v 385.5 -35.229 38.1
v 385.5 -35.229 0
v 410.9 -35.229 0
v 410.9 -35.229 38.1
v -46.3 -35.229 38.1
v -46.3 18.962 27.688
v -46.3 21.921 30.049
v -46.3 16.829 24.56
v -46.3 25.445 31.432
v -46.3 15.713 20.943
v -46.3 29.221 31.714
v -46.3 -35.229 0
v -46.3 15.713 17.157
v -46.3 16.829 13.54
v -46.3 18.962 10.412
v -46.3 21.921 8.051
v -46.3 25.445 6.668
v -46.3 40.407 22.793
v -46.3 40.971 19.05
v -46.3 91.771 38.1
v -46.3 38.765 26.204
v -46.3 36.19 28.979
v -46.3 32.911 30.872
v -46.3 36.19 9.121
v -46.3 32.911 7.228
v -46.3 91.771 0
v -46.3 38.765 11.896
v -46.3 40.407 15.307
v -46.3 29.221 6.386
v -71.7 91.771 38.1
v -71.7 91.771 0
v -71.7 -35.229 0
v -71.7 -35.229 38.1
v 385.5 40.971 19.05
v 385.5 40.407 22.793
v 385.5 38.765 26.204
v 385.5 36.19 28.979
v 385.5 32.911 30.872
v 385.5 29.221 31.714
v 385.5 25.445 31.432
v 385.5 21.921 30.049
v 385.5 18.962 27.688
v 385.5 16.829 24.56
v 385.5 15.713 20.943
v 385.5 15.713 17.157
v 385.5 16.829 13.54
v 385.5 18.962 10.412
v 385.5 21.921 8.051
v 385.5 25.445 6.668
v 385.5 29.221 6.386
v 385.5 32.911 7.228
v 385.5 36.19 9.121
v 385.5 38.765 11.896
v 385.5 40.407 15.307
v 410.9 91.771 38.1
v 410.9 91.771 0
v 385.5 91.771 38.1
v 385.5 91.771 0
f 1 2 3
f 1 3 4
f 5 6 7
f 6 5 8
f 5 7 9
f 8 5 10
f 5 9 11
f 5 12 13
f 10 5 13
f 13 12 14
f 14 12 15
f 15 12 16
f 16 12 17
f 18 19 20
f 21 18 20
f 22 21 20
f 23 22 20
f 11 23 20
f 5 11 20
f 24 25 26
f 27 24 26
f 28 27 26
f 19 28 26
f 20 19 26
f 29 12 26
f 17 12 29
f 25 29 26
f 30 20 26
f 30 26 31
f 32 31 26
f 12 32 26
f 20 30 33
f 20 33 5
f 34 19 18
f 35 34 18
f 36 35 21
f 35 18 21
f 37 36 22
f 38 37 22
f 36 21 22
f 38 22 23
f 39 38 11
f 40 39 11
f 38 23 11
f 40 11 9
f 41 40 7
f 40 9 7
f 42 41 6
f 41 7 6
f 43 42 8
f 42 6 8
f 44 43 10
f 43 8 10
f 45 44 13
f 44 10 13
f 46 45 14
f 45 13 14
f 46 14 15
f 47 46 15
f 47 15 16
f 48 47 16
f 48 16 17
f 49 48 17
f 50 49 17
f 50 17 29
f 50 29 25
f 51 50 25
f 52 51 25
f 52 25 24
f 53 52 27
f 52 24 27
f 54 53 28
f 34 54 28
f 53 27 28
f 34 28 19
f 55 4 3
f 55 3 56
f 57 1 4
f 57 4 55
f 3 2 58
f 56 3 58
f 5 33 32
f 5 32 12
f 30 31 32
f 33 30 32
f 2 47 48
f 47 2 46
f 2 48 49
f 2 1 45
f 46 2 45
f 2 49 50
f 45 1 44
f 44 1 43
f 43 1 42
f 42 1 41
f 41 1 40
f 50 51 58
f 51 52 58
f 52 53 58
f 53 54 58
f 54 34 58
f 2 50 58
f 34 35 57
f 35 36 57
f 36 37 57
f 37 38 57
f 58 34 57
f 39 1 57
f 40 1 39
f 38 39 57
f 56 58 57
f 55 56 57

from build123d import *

# Parameters (mm, degrees)
F1_DEPTH = 38.1
F2_R     = 12.7
F3_DEPTH = 431.8
F4_W     = 127
F4_H     = 38.1
F5_DEPTH = 25.4


with BuildPart() as f1:
    # F0 (on Top) → F1 (new body)
    with BuildSketch(Plane.XY):
        Polygon((-46.300181, 91.77144), (-71.700181, 91.77144), (-71.700181, -35.22856), (-46.300181, -35.22856), (-46.300181, 15.57144), (-46.300181, 40.97144), align=None)
    extrude(amount=F1_DEPTH)

    # F2 (on face) → F3 (join)
    with BuildSketch(Plane.YZ.offset(-46.300181)):
        with Locations((28.27144, 19.05)):
            Circle(F2_R)
    extrude(amount=F3_DEPTH)

    # F4 (on face) → F5 (join)
    with BuildSketch(Plane.YZ.offset(385.499819)):
        with Locations((28.27144, 19.05)):
            Rectangle(F4_W, F4_H)
    extrude(amount=F5_DEPTH)


solid = f1.part
